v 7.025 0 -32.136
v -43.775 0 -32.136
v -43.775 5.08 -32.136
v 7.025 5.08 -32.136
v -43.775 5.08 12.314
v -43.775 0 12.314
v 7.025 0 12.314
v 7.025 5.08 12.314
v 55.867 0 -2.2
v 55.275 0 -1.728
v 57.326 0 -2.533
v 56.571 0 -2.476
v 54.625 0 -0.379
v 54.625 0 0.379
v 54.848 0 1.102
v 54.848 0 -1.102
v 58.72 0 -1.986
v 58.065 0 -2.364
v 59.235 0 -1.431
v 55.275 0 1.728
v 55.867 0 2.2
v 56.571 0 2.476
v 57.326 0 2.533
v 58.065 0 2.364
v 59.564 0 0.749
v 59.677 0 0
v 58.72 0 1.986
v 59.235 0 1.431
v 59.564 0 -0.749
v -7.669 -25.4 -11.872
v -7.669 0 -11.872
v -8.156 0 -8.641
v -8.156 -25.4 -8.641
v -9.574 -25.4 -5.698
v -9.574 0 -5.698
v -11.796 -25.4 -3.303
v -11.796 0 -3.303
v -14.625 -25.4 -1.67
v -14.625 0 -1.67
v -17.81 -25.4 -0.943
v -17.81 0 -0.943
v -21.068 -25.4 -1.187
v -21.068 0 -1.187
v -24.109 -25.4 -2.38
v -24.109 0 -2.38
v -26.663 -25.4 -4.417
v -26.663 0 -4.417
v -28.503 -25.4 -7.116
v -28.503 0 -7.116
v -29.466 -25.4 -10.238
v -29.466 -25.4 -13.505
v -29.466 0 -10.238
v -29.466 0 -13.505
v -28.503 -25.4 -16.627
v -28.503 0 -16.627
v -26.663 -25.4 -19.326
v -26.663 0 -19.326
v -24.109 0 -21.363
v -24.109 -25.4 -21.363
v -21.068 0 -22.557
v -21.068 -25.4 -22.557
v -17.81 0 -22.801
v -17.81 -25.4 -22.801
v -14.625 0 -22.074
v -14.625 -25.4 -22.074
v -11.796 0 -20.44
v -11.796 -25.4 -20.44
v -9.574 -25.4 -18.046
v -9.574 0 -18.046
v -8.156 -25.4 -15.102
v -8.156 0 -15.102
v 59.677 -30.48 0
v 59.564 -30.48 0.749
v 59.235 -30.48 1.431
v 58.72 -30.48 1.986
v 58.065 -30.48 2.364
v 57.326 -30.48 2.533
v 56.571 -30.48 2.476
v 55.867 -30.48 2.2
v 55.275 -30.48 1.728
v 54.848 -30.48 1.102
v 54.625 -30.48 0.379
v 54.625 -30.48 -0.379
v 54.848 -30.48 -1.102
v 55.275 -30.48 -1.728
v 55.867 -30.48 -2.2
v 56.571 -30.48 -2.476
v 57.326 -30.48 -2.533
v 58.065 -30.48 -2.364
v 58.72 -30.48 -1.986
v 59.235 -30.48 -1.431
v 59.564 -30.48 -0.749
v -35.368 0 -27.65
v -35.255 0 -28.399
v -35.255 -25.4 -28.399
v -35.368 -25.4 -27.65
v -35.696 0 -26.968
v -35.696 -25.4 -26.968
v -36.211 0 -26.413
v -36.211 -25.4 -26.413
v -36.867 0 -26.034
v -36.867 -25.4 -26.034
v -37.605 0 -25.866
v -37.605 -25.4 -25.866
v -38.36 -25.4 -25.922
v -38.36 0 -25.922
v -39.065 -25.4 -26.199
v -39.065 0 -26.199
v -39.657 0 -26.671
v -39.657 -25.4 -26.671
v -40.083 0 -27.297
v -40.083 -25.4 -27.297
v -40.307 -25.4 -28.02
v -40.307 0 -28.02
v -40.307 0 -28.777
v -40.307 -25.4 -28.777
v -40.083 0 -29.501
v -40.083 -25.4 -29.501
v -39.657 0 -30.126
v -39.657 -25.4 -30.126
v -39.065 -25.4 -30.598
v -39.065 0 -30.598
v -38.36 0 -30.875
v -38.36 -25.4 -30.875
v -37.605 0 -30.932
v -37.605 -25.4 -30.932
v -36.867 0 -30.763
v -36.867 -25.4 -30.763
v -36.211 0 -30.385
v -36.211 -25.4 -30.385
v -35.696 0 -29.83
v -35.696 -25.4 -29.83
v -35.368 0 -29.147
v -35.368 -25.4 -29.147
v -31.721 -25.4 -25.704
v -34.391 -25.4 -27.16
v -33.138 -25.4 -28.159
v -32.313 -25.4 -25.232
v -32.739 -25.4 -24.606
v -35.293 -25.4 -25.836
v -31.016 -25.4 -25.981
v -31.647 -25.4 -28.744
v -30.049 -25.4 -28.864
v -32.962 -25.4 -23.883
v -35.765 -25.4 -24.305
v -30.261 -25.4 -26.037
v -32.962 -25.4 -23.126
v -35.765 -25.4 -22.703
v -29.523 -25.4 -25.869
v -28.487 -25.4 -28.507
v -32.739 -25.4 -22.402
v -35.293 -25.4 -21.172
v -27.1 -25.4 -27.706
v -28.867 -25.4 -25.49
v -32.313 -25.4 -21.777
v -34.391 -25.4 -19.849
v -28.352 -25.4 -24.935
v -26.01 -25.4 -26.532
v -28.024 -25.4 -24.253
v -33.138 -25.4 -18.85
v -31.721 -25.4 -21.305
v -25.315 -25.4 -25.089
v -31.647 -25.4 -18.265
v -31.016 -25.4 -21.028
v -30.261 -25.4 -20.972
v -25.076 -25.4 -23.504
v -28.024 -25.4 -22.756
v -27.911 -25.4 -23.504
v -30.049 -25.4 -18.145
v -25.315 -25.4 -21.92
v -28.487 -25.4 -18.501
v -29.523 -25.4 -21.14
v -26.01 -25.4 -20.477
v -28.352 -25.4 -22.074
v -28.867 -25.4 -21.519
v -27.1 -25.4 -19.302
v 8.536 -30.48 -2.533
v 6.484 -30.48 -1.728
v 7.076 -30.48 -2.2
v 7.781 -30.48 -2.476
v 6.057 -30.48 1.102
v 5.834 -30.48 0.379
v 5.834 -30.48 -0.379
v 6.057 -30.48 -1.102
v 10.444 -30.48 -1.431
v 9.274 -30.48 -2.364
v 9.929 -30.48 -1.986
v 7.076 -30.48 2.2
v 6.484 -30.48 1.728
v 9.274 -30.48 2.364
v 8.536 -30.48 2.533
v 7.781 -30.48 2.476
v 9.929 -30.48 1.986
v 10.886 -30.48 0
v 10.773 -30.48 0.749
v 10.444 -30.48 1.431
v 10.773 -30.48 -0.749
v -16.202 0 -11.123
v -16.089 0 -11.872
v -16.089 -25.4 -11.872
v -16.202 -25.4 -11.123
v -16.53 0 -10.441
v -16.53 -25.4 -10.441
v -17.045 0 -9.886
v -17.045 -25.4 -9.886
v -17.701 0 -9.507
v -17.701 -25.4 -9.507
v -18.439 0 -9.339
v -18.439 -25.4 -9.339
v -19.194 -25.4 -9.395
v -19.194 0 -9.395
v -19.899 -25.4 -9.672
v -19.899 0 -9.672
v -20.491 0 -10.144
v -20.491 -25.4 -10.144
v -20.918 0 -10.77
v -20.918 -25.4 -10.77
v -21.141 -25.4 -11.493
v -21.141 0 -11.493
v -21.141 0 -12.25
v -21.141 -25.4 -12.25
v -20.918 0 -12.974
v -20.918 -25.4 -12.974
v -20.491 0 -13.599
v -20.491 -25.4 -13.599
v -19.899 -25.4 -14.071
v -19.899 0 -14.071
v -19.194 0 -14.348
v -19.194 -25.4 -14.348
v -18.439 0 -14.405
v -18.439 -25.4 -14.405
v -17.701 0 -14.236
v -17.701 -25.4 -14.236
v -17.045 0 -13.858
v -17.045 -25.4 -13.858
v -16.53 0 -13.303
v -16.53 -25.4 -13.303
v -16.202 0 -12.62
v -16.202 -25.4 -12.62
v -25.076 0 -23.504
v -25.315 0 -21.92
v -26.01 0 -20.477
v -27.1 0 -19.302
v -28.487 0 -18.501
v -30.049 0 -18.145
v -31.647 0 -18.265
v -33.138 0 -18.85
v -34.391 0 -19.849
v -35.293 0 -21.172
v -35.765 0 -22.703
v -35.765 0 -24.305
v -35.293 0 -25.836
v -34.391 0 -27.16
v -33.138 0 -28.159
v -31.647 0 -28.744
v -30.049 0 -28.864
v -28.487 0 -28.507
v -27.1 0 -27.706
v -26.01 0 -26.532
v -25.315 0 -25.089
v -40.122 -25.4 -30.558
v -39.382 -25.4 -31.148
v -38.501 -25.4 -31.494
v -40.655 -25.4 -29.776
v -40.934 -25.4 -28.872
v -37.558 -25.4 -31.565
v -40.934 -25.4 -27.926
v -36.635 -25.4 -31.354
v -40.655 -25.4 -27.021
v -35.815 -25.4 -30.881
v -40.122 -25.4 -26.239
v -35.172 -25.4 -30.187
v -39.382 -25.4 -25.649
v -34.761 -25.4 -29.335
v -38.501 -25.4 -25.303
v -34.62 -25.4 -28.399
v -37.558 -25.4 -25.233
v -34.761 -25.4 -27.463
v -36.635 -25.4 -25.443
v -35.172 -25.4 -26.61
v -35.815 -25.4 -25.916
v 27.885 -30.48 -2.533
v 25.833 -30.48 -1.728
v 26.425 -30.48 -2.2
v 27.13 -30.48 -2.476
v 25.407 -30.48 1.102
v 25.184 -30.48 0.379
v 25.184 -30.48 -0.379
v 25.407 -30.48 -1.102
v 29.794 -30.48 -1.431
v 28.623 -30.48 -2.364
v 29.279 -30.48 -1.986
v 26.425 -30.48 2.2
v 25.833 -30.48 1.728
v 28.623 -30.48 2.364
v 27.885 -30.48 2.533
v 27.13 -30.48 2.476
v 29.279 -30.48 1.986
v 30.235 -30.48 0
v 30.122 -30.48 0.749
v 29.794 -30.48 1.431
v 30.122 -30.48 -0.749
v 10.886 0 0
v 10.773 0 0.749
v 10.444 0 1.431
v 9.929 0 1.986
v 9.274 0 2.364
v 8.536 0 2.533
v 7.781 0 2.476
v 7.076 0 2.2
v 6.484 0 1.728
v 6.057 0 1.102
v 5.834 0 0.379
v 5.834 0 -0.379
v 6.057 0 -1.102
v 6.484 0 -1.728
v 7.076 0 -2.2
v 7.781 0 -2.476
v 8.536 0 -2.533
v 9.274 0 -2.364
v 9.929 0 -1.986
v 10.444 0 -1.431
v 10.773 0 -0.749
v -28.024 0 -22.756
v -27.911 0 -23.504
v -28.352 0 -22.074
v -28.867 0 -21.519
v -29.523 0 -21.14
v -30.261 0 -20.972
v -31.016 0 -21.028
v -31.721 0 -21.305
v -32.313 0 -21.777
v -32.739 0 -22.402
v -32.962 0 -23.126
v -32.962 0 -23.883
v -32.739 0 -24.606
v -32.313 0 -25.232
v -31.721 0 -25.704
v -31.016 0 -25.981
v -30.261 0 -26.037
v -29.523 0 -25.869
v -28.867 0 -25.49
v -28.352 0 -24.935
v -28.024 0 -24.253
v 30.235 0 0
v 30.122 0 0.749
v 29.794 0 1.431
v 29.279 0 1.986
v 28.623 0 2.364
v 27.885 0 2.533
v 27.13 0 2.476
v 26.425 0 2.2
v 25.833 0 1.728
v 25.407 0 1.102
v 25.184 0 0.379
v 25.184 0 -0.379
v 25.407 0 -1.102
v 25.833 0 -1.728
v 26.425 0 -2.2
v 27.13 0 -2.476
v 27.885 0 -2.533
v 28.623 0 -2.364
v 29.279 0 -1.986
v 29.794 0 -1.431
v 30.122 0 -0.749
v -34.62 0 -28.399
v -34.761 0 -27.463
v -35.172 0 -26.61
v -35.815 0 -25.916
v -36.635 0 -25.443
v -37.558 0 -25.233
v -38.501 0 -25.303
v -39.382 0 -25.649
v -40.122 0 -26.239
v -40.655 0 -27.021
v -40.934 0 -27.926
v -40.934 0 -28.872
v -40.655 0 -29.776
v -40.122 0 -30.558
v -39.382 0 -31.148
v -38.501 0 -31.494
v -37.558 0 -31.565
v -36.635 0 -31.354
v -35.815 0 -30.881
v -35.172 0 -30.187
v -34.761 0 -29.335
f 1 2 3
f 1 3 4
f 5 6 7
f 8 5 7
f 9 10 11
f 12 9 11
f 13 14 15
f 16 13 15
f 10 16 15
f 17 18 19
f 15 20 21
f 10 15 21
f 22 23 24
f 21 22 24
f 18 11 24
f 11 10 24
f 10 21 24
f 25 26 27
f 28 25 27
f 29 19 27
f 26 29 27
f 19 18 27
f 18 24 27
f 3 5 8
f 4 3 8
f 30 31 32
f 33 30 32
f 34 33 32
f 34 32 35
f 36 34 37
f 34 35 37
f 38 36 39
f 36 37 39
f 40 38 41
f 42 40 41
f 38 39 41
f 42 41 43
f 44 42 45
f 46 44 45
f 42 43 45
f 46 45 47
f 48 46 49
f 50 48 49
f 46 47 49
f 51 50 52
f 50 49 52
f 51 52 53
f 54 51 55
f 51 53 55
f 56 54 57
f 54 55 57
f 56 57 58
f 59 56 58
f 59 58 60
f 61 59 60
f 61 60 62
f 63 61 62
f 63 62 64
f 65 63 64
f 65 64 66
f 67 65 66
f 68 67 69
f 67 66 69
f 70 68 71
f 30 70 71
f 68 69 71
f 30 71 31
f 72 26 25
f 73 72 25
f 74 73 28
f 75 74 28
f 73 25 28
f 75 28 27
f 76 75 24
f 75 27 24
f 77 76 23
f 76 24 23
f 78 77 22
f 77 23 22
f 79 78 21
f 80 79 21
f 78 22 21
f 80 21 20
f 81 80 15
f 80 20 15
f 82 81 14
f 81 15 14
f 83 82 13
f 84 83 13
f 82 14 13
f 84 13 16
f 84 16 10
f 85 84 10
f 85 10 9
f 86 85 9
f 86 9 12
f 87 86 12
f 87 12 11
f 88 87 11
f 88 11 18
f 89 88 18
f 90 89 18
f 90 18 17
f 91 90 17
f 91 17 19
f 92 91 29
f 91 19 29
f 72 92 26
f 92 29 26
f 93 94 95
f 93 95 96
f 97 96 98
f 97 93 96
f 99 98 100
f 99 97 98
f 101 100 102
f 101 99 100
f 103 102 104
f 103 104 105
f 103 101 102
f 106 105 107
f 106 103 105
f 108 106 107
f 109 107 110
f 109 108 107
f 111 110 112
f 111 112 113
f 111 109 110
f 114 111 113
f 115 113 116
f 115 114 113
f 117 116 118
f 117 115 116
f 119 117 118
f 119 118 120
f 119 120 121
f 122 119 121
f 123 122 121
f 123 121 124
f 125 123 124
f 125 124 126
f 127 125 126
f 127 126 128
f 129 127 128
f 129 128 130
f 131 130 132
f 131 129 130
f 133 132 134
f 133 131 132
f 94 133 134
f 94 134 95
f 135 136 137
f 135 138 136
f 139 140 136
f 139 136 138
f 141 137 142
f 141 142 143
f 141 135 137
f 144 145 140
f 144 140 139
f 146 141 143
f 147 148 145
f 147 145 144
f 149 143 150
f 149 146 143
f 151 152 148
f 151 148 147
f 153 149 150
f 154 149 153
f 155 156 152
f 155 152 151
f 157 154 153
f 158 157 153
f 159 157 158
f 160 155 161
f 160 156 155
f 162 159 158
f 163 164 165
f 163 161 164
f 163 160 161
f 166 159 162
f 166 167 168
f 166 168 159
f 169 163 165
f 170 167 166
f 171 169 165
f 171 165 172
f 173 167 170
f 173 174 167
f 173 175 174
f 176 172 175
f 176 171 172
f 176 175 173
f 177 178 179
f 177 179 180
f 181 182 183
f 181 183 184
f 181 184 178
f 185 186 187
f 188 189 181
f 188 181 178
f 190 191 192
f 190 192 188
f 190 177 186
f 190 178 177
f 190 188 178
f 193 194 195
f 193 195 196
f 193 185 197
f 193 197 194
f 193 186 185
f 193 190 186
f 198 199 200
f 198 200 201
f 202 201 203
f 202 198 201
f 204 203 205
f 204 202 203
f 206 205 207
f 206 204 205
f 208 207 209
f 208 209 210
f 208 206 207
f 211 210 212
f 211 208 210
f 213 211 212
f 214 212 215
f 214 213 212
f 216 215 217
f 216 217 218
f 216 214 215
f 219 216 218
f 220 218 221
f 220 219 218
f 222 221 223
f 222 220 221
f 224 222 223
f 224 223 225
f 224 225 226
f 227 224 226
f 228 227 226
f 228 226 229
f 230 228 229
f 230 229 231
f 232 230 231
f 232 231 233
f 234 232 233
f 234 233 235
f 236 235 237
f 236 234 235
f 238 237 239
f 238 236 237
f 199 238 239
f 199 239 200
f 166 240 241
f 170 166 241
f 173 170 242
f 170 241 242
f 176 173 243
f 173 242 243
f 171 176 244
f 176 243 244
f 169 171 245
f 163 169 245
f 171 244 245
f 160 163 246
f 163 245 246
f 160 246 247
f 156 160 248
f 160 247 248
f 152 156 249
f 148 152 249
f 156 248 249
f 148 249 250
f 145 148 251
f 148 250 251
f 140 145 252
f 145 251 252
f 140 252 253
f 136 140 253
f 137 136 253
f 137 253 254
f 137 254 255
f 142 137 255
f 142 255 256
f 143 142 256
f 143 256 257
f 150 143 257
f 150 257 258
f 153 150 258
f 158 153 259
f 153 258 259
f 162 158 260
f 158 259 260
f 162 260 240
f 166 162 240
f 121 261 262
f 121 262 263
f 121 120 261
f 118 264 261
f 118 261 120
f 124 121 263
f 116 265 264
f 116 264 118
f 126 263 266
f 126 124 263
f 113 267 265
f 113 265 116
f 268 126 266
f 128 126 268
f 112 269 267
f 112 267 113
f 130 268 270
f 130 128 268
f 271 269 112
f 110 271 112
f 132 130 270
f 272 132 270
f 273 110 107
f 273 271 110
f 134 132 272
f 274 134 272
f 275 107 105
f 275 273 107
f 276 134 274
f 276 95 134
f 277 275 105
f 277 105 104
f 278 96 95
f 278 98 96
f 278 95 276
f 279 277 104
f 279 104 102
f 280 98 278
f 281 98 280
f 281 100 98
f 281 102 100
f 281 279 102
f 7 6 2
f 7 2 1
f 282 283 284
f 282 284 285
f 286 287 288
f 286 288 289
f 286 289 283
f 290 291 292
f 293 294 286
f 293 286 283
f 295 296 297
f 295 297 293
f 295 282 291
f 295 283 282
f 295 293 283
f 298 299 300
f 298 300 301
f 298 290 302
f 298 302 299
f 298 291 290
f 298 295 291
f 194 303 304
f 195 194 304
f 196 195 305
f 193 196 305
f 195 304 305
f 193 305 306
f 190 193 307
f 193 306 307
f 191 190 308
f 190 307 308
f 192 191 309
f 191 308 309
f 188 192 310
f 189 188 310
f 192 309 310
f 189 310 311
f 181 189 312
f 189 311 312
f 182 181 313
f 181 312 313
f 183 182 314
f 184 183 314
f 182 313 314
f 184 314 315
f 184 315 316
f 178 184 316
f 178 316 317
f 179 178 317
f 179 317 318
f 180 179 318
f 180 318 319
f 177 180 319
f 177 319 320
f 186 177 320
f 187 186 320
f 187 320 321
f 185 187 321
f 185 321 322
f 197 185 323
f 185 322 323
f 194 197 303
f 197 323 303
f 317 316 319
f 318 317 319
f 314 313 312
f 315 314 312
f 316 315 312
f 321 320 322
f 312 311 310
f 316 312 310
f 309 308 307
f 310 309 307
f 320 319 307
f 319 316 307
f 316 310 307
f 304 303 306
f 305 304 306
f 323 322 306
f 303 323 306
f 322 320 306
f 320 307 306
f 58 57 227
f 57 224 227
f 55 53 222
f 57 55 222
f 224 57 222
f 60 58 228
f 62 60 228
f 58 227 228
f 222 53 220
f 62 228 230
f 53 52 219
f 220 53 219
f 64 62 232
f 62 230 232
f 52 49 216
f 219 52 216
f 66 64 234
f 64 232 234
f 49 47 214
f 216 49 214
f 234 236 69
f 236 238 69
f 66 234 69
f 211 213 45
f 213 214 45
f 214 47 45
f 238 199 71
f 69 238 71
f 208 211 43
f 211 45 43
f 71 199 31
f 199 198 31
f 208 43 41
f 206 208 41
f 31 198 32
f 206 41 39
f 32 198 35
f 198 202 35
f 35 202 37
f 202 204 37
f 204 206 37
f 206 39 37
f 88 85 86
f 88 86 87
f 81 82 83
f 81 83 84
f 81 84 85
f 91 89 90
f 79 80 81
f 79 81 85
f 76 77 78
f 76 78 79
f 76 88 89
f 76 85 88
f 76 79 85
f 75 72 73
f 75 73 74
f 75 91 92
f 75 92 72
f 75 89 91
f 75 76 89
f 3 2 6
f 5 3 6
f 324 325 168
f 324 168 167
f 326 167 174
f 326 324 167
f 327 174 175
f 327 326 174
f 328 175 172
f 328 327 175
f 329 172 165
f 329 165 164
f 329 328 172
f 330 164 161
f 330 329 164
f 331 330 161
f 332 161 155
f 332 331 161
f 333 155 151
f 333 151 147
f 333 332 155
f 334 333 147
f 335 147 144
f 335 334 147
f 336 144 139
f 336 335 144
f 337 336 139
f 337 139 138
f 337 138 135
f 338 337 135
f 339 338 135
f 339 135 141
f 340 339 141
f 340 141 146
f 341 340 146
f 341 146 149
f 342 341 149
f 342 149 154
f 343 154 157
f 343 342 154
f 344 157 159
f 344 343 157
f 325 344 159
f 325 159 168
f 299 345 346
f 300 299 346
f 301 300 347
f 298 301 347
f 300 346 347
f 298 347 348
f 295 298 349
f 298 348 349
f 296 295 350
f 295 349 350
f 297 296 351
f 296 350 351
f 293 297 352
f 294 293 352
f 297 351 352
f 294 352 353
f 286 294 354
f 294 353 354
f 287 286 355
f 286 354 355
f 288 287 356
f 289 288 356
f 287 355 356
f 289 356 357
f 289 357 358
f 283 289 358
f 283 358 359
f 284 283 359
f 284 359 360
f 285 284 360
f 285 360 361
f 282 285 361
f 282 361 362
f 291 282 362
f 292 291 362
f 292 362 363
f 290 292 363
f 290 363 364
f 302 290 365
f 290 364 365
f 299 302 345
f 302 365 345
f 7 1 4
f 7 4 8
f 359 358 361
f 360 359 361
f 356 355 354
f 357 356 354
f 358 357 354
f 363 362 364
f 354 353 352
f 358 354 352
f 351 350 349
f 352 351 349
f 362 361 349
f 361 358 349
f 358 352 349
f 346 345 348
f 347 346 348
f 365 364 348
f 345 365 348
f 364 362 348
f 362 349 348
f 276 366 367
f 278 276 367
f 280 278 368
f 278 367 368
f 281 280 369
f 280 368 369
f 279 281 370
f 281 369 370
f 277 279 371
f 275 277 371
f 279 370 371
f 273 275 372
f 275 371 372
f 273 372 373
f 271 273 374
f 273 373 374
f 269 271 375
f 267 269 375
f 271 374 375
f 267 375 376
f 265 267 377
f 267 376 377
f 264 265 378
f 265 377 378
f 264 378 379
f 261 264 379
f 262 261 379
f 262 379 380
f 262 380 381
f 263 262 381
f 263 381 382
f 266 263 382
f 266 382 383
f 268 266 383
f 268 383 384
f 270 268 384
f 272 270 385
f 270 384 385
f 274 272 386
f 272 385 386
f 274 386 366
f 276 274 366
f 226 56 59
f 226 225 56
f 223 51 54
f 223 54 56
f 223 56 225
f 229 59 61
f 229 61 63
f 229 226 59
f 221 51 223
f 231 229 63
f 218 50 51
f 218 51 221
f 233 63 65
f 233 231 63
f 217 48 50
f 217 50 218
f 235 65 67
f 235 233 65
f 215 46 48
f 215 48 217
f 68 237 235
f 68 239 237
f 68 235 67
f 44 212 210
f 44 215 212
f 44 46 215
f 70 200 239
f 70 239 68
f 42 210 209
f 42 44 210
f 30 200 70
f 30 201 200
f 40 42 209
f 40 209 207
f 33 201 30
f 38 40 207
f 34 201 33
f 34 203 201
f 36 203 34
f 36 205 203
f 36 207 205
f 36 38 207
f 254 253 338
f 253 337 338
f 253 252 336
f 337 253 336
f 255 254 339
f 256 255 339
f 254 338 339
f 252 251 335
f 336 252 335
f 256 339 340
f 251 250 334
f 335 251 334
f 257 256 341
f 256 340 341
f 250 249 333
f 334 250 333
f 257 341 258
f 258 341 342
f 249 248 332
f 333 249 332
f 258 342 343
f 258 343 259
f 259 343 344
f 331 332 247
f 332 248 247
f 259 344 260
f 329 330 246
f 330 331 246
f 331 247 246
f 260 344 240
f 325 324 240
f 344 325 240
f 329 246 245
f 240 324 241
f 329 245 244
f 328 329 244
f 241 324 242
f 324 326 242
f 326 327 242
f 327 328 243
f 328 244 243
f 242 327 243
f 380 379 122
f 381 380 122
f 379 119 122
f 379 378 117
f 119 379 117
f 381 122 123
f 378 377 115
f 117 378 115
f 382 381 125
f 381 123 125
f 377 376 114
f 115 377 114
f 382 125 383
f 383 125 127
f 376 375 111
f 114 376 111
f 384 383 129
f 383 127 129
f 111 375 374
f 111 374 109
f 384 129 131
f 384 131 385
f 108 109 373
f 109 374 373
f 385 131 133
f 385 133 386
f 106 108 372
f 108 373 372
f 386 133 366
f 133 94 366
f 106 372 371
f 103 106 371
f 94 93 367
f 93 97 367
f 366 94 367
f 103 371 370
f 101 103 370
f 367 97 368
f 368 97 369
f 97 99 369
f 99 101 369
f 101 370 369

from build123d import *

# Parameters (mm, degrees)
F1_R     = 10.959745
F1_R_2   = 2.54
F2_DEPTH = 25.4
F1_R_3   = 5.374532
F3_DEPTH = 25.4
F1_R_4   = 3.175
F4_DEPTH = 25.4
F0_W     = 50.8
F0_H     = 44.45
F5_DEPTH = 5.08
F6_R     = 2.54
F7_DEPTH = 30.48
F8_DEPTH = 30.48
F9_DEPTH = 30.48


with BuildPart() as f2:
    # F1 (on Front) → F2 (new body)
    with BuildSketch(Plane.XZ):
        with Locations((-18.629057, -11.871674)):
            Circle(F1_R)
        with Locations((-18.629057, -11.871674)):
            Circle(F1_R_2, mode=Mode.SUBTRACT)
    extrude(amount=F2_DEPTH)


with BuildPart() as f3:
    # F1 (on Front) → F3 (new body)
    with BuildSketch(Plane.XZ):
        with Locations((-30.45081, -23.504406)):
            Circle(F1_R_3)
        with Locations((-30.45081, -23.504406)):
            Circle(F1_R_2, mode=Mode.SUBTRACT)
    extrude(amount=F3_DEPTH)


with BuildPart() as f4:
    # F1 (on Front) → F4 (new body)
    with BuildSketch(Plane.XZ):
        with Locations((-37.794903, -28.398743)):
            Circle(F1_R_4)
        with Locations((-37.794903, -28.398743)):
            Circle(F1_R_2, mode=Mode.SUBTRACT)
    extrude(amount=F4_DEPTH)


with BuildPart() as f5:
    # F0 (on Front) → F5 (new body)
    with BuildSketch(Plane.XZ):
        with Locations((-18.374677, -9.91119)):
            Rectangle(F0_W, F0_H)
    extrude(amount=-F5_DEPTH)


with BuildPart() as f7:
    # F6 (on Front) → F7 (new body)
    with BuildSketch(Plane.XZ):
        with Locations((8.345753, 0)):
            Circle(F6_R)
    extrude(amount=F7_DEPTH)


with BuildPart() as f8:
    # F6 (on Front) → F8 (new body)
    with BuildSketch(Plane.XZ):
        with Locations((27.695158, 0)):
            Circle(F6_R)
    extrude(amount=F8_DEPTH)


with BuildPart() as f9:
    # F6 (on Front) → F9 (new body)
    with BuildSketch(Plane.XZ):
        with Locations((57.136599, 0)):
            Circle(F6_R)
    extrude(amount=F9_DEPTH)


solid = Compound([f2.part, f3.part, f4.part, f5.part, f7.part, f8.part, f9.part])
